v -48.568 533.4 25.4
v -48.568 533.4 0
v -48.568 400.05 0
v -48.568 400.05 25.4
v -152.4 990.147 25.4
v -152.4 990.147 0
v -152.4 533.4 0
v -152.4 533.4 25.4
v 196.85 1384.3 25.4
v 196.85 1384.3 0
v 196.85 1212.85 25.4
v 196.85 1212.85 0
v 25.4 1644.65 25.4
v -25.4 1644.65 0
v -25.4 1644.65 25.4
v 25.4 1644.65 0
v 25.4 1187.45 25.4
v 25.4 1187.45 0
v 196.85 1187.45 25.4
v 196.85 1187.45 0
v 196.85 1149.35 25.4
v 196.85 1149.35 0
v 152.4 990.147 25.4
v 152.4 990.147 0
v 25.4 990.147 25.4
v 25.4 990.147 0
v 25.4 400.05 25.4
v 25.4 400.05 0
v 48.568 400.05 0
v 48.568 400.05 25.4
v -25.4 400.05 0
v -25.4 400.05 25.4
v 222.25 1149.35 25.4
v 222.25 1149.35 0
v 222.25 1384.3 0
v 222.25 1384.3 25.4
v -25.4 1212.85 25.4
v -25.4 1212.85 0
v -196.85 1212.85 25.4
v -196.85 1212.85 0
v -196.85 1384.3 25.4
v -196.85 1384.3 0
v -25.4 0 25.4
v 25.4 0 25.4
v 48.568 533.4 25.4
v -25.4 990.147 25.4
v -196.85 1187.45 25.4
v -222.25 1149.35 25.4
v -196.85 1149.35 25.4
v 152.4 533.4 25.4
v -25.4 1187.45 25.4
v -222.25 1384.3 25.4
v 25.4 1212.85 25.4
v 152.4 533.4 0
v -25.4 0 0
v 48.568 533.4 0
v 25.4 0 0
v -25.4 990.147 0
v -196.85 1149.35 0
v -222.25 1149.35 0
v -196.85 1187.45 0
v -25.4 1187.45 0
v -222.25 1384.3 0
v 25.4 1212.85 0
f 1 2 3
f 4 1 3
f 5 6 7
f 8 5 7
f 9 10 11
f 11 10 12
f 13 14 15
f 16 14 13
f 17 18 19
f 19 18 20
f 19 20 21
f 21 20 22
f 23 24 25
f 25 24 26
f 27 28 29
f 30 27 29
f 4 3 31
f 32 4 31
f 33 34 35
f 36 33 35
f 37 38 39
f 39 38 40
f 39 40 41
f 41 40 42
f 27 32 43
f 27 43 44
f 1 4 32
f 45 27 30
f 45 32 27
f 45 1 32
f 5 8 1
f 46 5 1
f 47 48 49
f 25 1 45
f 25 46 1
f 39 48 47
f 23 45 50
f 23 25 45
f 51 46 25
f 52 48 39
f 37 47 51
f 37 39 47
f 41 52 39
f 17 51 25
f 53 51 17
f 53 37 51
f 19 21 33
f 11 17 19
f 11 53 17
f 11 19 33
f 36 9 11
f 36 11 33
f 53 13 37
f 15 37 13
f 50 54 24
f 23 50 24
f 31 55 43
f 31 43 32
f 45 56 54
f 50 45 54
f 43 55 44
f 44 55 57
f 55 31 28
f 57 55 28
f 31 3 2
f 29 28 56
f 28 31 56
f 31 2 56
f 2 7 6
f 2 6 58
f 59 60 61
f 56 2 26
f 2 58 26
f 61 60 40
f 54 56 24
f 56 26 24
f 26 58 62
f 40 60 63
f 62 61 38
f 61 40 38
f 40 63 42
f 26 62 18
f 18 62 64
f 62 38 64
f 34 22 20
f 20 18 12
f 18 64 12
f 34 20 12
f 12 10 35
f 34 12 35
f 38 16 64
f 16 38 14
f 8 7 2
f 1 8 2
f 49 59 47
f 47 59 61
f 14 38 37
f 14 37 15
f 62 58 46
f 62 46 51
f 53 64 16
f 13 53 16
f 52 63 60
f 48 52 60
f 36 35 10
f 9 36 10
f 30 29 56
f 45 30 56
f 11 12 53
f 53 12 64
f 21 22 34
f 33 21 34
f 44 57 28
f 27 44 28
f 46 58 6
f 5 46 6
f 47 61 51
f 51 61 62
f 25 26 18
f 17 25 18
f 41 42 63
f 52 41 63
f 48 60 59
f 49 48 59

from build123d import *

# Parameters (mm, degrees)
F0_W     = 50.8
F0_H     = 400.05
F0_W_2   = 23.167712307
F0_H_2   = 133.35
F0_H_3   = 88.3720067978
F0_H_4   = 368.3754058838
F0_H_5   = 197.3025873184
F0_H_6   = 25.4
F0_H_7   = 431.8
F1_DEPTH = 25.4


with BuildPart() as f1:
    # F0 (on Top) → F1 (new body)
    with BuildSketch(Plane.XY):
        with Locations((0, 200.025)):
            Rectangle(F0_W, F0_H)
        with Locations((-36.9838561535, 466.725)):
            Rectangle(F0_W_2, F0_H_2)
        with Locations((0, 466.725)):
            Rectangle(F0_W, F0_H_2)
        with Locations((36.9838561535, 466.725)):
            Rectangle(F0_W_2, F0_H_2)
        with Locations((-36.9838561535, 577.5860033989)):
            Rectangle(F0_W_2, F0_H_3)
        with Locations((36.9838561535, 577.5860033989)):
            Rectangle(F0_W_2, F0_H_3)
        Polygon((-48.567712307, 621.7720067978), (-25.4, 621.7720067978), (-25.4, 990.1474126816), (-152.4, 990.1474126816), (-152.4, 533.4), (-48.567712307, 533.4), align=None)
        with Locations((0, 805.9597097397)):
            Rectangle(F0_W, F0_H_4)
        Polygon((25.4, 990.1474126816), (25.4, 621.7720067978), (48.567712307, 621.7720067978), (48.567712307, 533.4), (152.4, 533.4), (152.4, 990.1474126816), align=None)
        with Locations((0, 1088.7987063408)):
            Rectangle(F0_W, F0_H_5)
        Polygon((-196.85, 1187.45), (-25.4, 1187.45), (-25.4, 1212.85), (-196.85, 1212.85), (-196.85, 1384.3), (-222.25, 1384.3), (-222.25, 1149.35), (-196.85, 1149.35), align=None)
        with Locations((0, 1200.15)):
            Rectangle(F0_W, F0_H_6)
        Polygon((25.4, 1212.85), (25.4, 1187.45), (196.85, 1187.45), (196.85, 1149.35), (222.25, 1149.35), (222.25, 1384.3), (196.85, 1384.3), (196.85, 1212.85), align=None)
        with Locations((0, 1428.75)):
            Rectangle(F0_W, F0_H_7)
        with Locations((0, 577.5860033989)):
            Rectangle(F0_W, F0_H_3)
    extrude(amount=F1_DEPTH)


solid = f1.part
